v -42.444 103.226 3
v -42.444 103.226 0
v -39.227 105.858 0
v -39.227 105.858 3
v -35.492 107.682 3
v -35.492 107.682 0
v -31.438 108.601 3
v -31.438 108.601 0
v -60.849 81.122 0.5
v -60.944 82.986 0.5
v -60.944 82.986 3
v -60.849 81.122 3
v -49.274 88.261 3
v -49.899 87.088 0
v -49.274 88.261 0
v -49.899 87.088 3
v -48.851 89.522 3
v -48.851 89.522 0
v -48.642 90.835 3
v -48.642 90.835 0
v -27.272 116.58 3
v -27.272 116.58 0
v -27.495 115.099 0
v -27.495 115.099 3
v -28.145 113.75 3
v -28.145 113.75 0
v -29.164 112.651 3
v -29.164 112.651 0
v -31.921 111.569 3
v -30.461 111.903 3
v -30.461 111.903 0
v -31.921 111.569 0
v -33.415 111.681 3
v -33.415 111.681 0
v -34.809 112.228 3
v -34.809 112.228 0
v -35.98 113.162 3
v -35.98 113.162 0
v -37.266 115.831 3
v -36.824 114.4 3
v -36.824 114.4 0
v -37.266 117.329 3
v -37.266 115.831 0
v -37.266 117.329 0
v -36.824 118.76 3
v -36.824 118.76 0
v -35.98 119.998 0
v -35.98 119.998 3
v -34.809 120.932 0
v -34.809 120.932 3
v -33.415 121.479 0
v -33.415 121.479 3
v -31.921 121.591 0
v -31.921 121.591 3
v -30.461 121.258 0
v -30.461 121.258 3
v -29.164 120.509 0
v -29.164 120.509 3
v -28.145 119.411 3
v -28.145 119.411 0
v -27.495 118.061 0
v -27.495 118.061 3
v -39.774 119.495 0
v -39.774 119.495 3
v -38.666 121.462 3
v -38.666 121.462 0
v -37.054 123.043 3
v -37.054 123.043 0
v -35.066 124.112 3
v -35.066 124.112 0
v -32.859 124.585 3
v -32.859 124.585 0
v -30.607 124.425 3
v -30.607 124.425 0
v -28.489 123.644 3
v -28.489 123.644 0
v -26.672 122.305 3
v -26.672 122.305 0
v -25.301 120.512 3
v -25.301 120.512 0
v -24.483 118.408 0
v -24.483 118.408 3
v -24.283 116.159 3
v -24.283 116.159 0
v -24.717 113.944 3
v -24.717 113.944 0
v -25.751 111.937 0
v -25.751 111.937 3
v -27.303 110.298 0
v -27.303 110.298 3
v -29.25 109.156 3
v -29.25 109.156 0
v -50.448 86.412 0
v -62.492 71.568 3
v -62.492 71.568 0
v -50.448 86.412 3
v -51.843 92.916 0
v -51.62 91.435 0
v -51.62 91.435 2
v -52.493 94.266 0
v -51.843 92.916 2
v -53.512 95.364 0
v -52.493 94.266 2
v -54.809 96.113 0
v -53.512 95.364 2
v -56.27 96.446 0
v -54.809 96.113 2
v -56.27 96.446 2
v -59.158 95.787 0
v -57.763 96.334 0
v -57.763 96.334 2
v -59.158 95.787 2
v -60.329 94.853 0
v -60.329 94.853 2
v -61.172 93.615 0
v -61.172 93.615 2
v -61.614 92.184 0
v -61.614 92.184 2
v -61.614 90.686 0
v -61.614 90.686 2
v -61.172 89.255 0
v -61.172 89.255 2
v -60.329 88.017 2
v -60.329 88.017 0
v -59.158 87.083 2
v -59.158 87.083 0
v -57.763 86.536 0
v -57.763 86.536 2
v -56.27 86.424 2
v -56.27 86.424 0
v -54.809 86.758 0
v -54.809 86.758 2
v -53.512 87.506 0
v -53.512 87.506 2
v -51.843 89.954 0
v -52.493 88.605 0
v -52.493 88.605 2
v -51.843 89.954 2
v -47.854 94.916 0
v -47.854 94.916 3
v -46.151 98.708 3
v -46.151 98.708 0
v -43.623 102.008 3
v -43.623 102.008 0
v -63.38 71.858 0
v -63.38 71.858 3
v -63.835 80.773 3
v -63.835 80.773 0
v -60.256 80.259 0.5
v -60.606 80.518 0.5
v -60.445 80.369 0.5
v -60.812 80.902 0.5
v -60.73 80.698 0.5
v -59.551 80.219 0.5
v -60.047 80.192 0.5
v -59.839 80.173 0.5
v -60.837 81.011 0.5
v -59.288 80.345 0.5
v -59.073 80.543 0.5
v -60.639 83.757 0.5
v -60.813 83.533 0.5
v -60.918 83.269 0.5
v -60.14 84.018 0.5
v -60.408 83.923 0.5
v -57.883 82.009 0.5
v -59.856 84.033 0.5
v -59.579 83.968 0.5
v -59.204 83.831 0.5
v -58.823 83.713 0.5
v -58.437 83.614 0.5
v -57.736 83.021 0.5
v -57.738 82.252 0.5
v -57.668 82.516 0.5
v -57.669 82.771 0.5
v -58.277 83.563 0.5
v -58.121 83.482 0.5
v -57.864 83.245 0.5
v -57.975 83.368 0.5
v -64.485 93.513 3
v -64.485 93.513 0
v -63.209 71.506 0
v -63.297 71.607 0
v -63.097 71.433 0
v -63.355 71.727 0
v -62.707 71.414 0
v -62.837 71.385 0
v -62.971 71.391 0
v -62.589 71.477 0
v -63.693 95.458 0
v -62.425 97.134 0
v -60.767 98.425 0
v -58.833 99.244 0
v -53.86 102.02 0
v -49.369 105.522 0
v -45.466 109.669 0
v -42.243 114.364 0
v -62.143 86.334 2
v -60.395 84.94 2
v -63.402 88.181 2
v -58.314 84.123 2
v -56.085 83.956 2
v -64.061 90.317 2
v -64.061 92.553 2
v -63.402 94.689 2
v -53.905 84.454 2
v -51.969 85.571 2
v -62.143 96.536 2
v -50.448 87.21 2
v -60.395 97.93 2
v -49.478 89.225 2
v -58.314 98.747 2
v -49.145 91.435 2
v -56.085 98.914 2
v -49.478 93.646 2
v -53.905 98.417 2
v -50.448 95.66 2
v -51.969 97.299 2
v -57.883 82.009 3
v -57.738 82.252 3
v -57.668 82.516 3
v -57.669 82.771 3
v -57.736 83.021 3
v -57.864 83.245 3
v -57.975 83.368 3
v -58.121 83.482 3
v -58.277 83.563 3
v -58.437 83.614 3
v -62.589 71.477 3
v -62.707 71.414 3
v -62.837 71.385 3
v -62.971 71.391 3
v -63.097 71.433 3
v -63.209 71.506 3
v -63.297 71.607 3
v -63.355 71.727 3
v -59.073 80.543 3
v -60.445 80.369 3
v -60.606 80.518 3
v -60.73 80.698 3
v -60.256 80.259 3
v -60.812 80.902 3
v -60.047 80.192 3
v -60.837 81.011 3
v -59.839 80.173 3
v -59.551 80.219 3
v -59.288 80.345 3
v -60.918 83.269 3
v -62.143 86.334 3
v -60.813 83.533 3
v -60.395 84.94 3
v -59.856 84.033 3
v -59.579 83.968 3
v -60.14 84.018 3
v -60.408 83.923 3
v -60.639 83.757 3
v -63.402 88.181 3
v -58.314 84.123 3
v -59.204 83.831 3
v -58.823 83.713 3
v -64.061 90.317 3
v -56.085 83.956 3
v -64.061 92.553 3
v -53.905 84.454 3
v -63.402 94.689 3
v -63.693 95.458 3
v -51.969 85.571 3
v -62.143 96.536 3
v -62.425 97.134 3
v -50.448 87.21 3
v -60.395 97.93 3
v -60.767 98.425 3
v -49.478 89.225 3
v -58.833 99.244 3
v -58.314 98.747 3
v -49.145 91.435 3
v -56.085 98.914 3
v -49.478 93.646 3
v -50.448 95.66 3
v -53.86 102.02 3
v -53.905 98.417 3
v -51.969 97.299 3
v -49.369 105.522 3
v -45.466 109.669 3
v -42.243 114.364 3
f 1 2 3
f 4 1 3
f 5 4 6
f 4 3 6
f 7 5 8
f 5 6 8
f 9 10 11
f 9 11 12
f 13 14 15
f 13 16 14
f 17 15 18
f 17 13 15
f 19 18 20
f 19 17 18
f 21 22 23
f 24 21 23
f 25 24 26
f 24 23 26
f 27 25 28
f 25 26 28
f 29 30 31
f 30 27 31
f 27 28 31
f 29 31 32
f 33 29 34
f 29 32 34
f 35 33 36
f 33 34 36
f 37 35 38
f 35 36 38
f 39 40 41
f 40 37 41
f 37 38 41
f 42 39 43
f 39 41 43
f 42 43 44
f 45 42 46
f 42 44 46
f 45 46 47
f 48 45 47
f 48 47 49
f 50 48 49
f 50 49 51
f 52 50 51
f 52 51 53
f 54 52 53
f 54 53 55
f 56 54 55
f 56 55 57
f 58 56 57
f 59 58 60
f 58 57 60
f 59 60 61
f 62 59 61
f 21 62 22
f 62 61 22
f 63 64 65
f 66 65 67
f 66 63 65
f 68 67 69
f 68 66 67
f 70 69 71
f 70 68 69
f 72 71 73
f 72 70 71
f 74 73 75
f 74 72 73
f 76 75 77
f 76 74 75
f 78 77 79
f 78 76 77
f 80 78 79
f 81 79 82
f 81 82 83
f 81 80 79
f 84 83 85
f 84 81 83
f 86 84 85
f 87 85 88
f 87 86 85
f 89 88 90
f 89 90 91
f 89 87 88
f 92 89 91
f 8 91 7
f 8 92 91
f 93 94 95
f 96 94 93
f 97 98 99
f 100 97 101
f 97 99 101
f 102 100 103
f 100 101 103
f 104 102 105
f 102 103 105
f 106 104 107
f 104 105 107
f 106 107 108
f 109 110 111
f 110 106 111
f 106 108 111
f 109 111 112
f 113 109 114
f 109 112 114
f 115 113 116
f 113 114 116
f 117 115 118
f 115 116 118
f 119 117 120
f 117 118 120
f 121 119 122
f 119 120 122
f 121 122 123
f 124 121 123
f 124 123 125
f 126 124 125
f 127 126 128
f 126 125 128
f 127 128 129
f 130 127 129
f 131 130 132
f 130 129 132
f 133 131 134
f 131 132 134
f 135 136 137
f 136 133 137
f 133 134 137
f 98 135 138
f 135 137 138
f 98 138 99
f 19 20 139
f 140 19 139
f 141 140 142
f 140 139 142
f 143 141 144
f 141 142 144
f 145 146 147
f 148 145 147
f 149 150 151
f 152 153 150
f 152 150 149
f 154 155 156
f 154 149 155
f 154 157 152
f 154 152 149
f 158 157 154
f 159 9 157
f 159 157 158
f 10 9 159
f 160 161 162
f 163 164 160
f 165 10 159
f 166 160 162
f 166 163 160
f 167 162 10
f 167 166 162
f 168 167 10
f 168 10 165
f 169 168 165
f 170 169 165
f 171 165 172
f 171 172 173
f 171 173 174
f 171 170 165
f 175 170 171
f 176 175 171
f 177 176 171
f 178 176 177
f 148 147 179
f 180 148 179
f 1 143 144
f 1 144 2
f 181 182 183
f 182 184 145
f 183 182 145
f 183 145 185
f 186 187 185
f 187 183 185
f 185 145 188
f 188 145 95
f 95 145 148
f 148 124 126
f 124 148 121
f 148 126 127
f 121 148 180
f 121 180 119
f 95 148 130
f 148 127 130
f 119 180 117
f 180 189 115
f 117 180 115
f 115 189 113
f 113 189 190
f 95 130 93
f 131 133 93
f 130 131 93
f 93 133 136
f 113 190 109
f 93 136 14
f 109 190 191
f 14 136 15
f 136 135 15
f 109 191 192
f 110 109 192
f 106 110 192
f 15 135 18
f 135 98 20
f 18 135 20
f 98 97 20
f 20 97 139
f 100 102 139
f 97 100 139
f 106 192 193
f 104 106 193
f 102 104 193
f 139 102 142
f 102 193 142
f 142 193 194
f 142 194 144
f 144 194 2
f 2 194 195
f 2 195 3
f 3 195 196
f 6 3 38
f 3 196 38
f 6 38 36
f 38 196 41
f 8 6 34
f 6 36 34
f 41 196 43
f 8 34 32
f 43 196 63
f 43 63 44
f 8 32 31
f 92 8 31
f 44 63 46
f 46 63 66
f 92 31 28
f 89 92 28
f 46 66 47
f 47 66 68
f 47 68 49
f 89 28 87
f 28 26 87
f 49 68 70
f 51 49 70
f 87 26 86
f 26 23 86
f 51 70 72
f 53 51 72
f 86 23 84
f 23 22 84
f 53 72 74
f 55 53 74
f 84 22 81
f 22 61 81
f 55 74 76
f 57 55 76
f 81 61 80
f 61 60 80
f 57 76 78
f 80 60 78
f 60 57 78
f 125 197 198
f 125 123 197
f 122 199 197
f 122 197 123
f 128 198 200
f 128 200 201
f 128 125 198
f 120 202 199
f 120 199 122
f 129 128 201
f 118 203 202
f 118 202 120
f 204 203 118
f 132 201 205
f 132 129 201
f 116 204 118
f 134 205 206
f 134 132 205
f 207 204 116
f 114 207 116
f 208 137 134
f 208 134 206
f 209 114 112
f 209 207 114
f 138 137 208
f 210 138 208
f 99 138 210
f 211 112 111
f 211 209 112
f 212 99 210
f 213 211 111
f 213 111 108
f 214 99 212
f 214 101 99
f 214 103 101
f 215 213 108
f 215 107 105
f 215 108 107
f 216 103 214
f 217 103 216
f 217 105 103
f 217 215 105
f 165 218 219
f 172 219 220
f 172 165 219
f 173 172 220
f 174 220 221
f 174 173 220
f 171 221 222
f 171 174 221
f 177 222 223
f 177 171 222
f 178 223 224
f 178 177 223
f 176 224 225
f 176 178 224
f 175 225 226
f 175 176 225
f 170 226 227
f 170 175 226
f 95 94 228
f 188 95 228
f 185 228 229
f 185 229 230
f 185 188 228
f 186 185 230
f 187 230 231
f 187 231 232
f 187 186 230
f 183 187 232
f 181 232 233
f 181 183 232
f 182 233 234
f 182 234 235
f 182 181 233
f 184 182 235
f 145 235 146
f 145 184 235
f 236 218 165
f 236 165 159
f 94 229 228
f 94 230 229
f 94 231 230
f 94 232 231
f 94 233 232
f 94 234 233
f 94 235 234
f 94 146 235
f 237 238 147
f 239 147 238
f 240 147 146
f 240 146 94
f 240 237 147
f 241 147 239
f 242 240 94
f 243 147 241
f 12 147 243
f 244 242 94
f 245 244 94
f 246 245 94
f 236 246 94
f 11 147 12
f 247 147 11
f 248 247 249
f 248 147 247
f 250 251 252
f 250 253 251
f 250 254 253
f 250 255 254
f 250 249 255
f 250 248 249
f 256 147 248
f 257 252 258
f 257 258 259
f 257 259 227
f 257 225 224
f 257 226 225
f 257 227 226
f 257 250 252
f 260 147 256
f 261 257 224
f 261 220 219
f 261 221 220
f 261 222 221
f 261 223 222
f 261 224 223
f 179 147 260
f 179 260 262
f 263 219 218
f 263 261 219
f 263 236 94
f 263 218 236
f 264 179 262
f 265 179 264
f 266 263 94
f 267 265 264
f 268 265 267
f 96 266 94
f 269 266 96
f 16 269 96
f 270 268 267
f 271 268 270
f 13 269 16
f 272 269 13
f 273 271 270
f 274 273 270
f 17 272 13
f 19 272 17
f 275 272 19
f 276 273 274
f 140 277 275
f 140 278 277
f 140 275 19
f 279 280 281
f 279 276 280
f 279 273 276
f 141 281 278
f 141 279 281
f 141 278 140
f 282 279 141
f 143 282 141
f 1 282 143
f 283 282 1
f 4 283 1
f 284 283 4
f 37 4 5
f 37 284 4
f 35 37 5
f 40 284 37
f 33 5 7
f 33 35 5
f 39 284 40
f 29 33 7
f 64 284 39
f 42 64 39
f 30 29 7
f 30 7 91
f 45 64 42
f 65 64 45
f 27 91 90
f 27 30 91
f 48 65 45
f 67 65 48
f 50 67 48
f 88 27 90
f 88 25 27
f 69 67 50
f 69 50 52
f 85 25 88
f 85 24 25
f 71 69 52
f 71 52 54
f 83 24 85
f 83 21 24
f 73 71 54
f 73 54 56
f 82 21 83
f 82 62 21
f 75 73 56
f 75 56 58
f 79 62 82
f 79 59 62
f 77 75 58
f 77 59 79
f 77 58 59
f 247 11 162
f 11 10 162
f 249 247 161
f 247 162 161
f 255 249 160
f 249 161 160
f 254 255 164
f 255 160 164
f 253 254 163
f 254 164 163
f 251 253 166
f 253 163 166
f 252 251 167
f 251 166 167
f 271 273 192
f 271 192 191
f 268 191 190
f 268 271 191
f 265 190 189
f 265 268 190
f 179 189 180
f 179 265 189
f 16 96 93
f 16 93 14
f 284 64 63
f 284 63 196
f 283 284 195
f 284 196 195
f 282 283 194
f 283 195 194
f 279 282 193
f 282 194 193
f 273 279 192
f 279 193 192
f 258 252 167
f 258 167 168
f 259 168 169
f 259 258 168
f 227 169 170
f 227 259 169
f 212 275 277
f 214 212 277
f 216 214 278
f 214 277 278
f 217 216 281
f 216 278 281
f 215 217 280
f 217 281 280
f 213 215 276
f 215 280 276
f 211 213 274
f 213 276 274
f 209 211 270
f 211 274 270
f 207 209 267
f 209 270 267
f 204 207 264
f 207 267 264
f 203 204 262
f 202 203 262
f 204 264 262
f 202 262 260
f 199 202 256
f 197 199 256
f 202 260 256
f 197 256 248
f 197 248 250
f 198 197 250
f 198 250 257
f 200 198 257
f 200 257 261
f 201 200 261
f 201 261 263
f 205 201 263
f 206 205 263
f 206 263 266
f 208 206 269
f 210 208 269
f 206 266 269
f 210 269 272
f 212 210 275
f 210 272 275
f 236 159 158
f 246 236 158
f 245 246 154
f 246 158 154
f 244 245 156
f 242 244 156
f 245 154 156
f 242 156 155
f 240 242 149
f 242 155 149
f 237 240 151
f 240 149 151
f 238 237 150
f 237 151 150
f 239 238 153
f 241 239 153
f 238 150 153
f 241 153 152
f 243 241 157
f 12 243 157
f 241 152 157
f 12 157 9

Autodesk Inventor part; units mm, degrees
ref_plane "YZ Plane" through (0, 0, 0) normal (1, 0, 0) x (0, 1, 0)
ref_plane "XZ Plane" through (0, 0, 0) normal (0, 1, 0) x (-1, 0, 0)
ref_plane "XY Plane" through (0, 0, 0) normal (0, 0, 1) x (1, 0, 0)
sketch "スケッチ2" plane through (0, 0, 0) normal (0, 0, 1) x (1, 0, 0)
  circle A0 centre (-56.644, 91.4364) radius 8.025
  circle A1 centre (-56.644, 91.4364) radius 5.025
  arc A2 (-29.1424, 109.2011) -> (-49.1672, 88.5212) centre (-14.5297, 75.0161) ccw
  arc A3 (-59.7983, 98.8155) -> (-39.7735, 119.4954) centre (-74.411, 133.0005) ccw
  circle A4 centre (-32.2967, 116.5802) radius 8.025
  circle A5 centre (-32.2967, 116.5802) radius 5.025
  line L0 (-50.8789, 85.8539) -> (-64.3562, 71.9357)
  line L1 (-64.3562, 71.9357) -> (-64.668, 91.3073)
  line L2 (-56.644, 91.4364) -> (-32.2967, 116.5802) construction
  point P0 (0, 0)
  point P1 (0, 0)
  dimension "d5" = 45
extrude "押し出し2" add sketch "スケッチ2" along normal blind 3
fillet "フィレット2" radius 0.5 1 edges at (-64.3562, 71.9357, 1.5)
sketch "スケッチ3" plane through (0, 0, 3) normal (0, 0, 1) x (1, 0, 0)
  line L0 (-63.5165, 72.8029) -> (-50.8789, 85.8539) projected
  arc A0 (-64.3756, 73.1427) -> (-63.5165, 72.8029) centre (-63.8757, 73.1507) ccw projected
  line L1 (-64.668, 91.3073) -> (-64.3756, 73.1427) projected
  arc A1 (-59.7983, 98.8155) -> (-64.668, 91.3073) centre (-56.644, 91.4364) ccw projected
  circle A2 centre (-56.644, 91.4364) radius 5.025 projected
  arc A3 (-50.8789, 85.8539) -> (-49.1672, 88.5212) centre (-56.644, 91.4364) ccw projected
  line L2 (-64.2129, 94.1033) -> (-63.8416, 71.0319)
  point P0 (0, 0)
  point P1 (-63.8676, 72.6508)
  dimension "d9" = 0.5
extrude "押し出し3" cut sketch "スケッチ3" against normal through all
fillet "フィレット3" radius 1 1 edges at (-63.8676, 72.6508, 1.5)
sketch "スケッチ4" plane through (0, 0, 3) normal (0, 0, 1) x (1, 0, 0)
  circle A0 centre (-56.644, 91.4364) radius 5.025 projected
  circle A1 centre (-32.2967, 116.5802) radius 5.025 projected
  arc A2 (-50.8789, 85.8539) -> (-49.1672, 88.5212) centre (-56.644, 91.4364) ccw projected
  line L0 (-50.8789, 85.8539) -> (-62.1849, 74.178) projected
  arc A3 (-63.9031, 74.8576) -> (-62.1849, 74.178) centre (-62.9033, 74.8737) ccw projected
  line L1 (-63.9031, 74.8576) -> (-64.2129, 94.1033) projected
  arc A4 (-59.7983, 98.8155) -> (-64.2129, 94.1033) centre (-56.644, 91.4364) ccw projected
  arc A5 (-59.7983, 98.8155) -> (-39.7735, 119.4954) centre (-74.411, 133.0005) ccw projected
  arc A6 (-29.1424, 109.2011) -> (-39.7735, 119.4954) centre (-32.2967, 116.5802) ccw projected
  arc A7 (-29.1424, 109.2011) -> (-49.1672, 88.5212) centre (-14.5297, 75.0161) ccw projected
  point P0 (0, 0)
sketch "スケッチ5" plane through (0, 0, 3) normal (0, 0, 1) x (1, 0, 0)
  circle A0 centre (-56.6451, 91.4352) radius 5.025
  circle A1 centre (-32.2979, 116.579) radius 5.025
  arc A2 (-50.2754, 86.5539) -> (-49.1683, 88.52) centre (-56.6451, 91.4352) ccw
  line L0 (-53.8399, 82.796) -> (-62.186, 74.1768)
  arc A3 (-63.9043, 74.8564) -> (-63.4923, 74.0635) centre (-62.9044, 74.8725) ccw
  line L1 (-63.9043, 74.8564) -> (-64.1215, 88.3503)
  arc A4 (-59.7994, 98.8143) -> (-64.4699, 93.2166) centre (-56.6451, 91.4352) ccw
  arc A5 (-59.7994, 98.8143) -> (-39.7746, 119.4942) centre (-74.4122, 132.9993) ccw
  arc A6 (-29.1436, 109.1999) -> (-39.7746, 119.4942) centre (-32.2979, 116.579) ccw
  arc A7 (-29.1436, 109.1999) -> (-49.1683, 88.52) centre (-14.5308, 75.0149) ccw
  line L2 (-83.3619, 46.2586) -> (-83.0117, 46.8656)
  arc A8 (-83.0117, 46.8656) -> (-84.2091, 48.3089) centre (-83.8778, 47.3654) ccw
  arc A9 (-84.8038, 48.1181) -> (-84.2091, 48.3089) centre (-88.0269, 59.1832) ccw
  arc A10 (-84.8038, 48.1181) -> (-85.306, 46.5345) centre (-84.5242, 47.158) ccw
  arc A11 (-85.0521, 46.1918) -> (-85.306, 46.5345) centre (-90.0169, 42.7785) ccw
  arc A12 (-85.0521, 46.1918) -> (-83.3619, 46.2586) centre (-84.2281, 46.7584) ccw
  arc A13 (-83.3002, 71.3425) -> (-83.1434, 69.6224) centre (-82.7197, 70.5282) ccw
  arc A14 (-76.5108, 59.6362) -> (-83.1434, 69.6224) centre (-88.0269, 59.1832) ccw
  arc A15 (-76.5108, 59.6362) -> (-74.7281, 59.0541) centre (-75.5116, 59.6755) ccw
  line L3 (-74.7281, 59.0541) -> (-66.7908, 69.0625)
  arc A16 (-66.7908, 69.0625) -> (-66.5756, 69.7348) centre (-67.5743, 69.6838) ccw
  line L4 (-66.5756, 69.7348) -> (-66.7153, 72.4721)
  arc A17 (-66.7153, 72.4721) -> (-67.8599, 73.4104) centre (-67.714, 72.4211) ccw
  arc A18 (-72.6132, 76.6262) -> (-67.8599, 73.4104) centre (-68.4798, 77.615) ccw
  arc A19 (-72.6132, 76.6262) -> (-73.9849, 77.3105) centre (-73.5858, 76.3936) ccw
  arc A20 (-73.9849, 77.3105) -> (-82.4826, 71.9828) centre (-60.5442, 46.4316) ccw
  arc A21 (-83.3002, 71.3425) -> (-82.4826, 71.9828) centre (-89.9903, 80.7269) ccw
  arc A22 (-110.8315, 31.539) -> (-109.4939, 30.5036) centre (-109.8361, 31.4432) ccw
  arc A23 (-101.7829, 26.9363) -> (-109.4939, 30.5036) centre (-107.4323, 24.8423) ccw
  arc A24 (-101.7829, 26.9363) -> (-100.1278, 26.5873) centre (-100.8452, 27.2839) ccw
  line L5 (-100.1278, 26.5873) -> (-91.546, 35.4257)
  arc A25 (-91.546, 35.4257) -> (-91.9436, 37.0698) centre (-92.2634, 36.1224) ccw
  arc A26 (-93.6931, 47.552) -> (-91.9436, 37.0698) centre (-90.0169, 42.7785) ccw
  arc A27 (-93.6931, 47.552) -> (-93.8022, 49.2096) centre (-94.3033, 48.3443) ccw
  arc A28 (-99.3351, 56.9581) -> (-93.8022, 49.2096) centre (-88.0269, 59.1832) ccw
  arc A29 (-99.3351, 56.9581) -> (-101.1863, 57.258) centre (-100.3162, 56.765) ccw
  line L6 (-101.1863, 57.258) -> (-106.2752, 48.2771)
  arc A30 (-106.2752, 48.2771) -> (-105.4755, 46.7866) centre (-105.4052, 47.7841) ccw
  arc A31 (-109.0024, 35.6122) -> (-105.4755, 46.7866) centre (-105.8991, 40.7765) ccw
  arc A32 (-109.0024, 35.6122) -> (-110.5128, 34.8508) centre (-109.5174, 34.755) ccw
  line L7 (-110.5128, 34.8508) -> (-110.8315, 31.539)
  circle A33 centre (-68.4798, 77.615) radius 1.25
  arc A34 (-64.1344, 80.7577) -> (-66.454, 82.6296) centre (-66.1318, 80.6557) ccw
  line L8 (-64.1344, 80.7577) -> (-63.5026, 68.3807)
  line L9 (-63.5026, 68.3807) -> (-76.8311, 51.5743)
  line L10 (-76.8311, 51.5743) -> (-83.9322, 39.2676)
  arc A35 (-84.9769, 37.8848) -> (-83.9322, 39.2676) centre (-90.0169, 42.7785) ccw
  line L11 (-84.9769, 37.8848) -> (-102.3922, 19.9486)
  arc A36 (-114.425, 25.5151) -> (-102.3922, 19.9486) centre (-107.4323, 24.8423) ccw
  line L12 (-114.425, 25.5151) -> (-112.8918, 41.4493)
  arc A37 (-112.0111, 44.2398) -> (-112.8918, 41.4493) centre (-105.8991, 40.7765) ccw
  line L13 (-112.0111, 44.2398) -> (-99.7723, 65.8386)
  arc A38 (-91.2432, 72.2945) -> (-99.7723, 65.8386) centre (-88.0269, 59.1832) ccw
  arc A39 (-91.2432, 72.2945) -> (-84.4369, 74.2589) centre (-89.9903, 80.7269) ccw
  arc A40 (-66.454, 82.6296) -> (-84.4369, 74.2589) centre (-60.5442, 46.4316) ccw
  circle A41 centre (-56.6793, 91.4683) radius 4
  circle A42 centre (-56.6793, 91.4683) radius 1.25
  circle A43 centre (-90.0169, 42.7785) radius 3.025
  circle A44 centre (-105.8991, 40.7765) radius 3.025
  circle A45 centre (-107.4323, 24.8423) radius 3.025
  circle A46 centre (-88.0269, 59.1832) radius 8.525
  circle A47 centre (-56.6793, 91.4683) radius 1.25
  line L14 (-32.2979, 116.579) -> (-56.6793, 91.4683)
  line L15 (-56.6793, 91.4683) -> (-88.0269, 59.1832)
  line L16 (-63.1972, 68.283) -> (-63.8347, 80.773)
  arc A48 (-63.8347, 80.773) -> (-66.5024, 82.9257) centre (-66.1318, 80.6557) ccw
  arc A49 (-66.5024, 82.9257) -> (-84.6323, 74.4865) centre (-60.5442, 46.4316) ccw
  arc A50 (-91.2565, 72.6) -> (-84.6323, 74.4865) centre (-89.9903, 80.7269) ccw
  arc A51 (-91.2565, 72.6) -> (-100.0334, 65.9865) centre (-88.0269, 59.1832) ccw
  line L17 (-100.0334, 65.9865) -> (-112.2721, 44.3877)
  arc A52 (-112.2721, 44.3877) -> (-113.1904, 41.4781) centre (-105.8991, 40.7765) ccw
  line L18 (-113.1904, 41.4781) -> (-114.7236, 25.5439)
  arc A53 (-114.7236, 25.5439) -> (-102.177, 19.7396) centre (-107.4323, 24.8423) ccw
  line L19 (-102.177, 19.7396) -> (-84.7616, 37.6758)
  arc A54 (-84.7616, 37.6758) -> (-83.6724, 39.1176) centre (-90.0169, 42.7785) ccw
  line L20 (-83.6724, 39.1176) -> (-76.5823, 51.4052)
  line L21 (-76.5823, 51.4052) -> (-63.1972, 68.283)
  arc A55 (-50.1385, 86.7434) -> (-64.1215, 88.3503) centre (-56.6793, 91.4683) ccw
  line L22 (-63.8347, 80.773) -> (-64.5039, 93.8831)
  line L23 (-76.8311, 51.5743) -> (-63.2204, 68.7366)
  circle A56 centre (-62.7886, 70.0857) radius 0.5
  line L24 (-62.3833, 69.7929) -> (-50.1385, 86.7434)
  line L25 (-63.5026, 68.3807) -> (-63.2204, 68.7366)
  line L26 (-62.3968, 69.775) -> (-61.9303, 70.3632)
  point P0 (0, 0)
  point P1 (0, 0)
  point P2 (0, 0)
  point P3 (-64.214, 94.1021)
  point P4 (-63.996, 83.9328)
  point P5 (-64.0495, 83.8777)
  point P6 (-64.2363, 88.6401)
  point P7 (-64.1215, 88.3503)
  point P8 (-50.2754, 86.5539)
  point P9 (-63.2879, 70.0602)
  point P10 (-64.0754, 85.487)
  point P11 (-58.8289, 99.2457)
  point P12 (-49.1573, 88.5483)
  point P13 (-64.012, 81.5482)
  point P14 (-64.485, 93.5124)
  dimension "d13" = 0.3
  dimension "d14" = 1
extrude "押し出し4" cut sketch "スケッチ5" against normal blind 3 contours L22 A48 L1 L15 | L16 A3 L8 L1 A48 | L8 A3 L1
extrude "押し出し5" cut sketch "スケッチ5" against normal blind 3 contours A0 L15 A41 L14 | A0 L14 A55 L24 A56 L16 L22 L15 | L14 A41 L15 A0 | A0 L15 L22 L1 A55 A4 A5 L14 | L14 A42 L15 A41 | A41 L15 A42 L14 | L22 A48 L1 L15 | L15 L1 L22 | A2 L24 A55 | A5 A4 L22 A55 | L14 L15 A42 | A42 L15 L14 | L22 A55 L1 | L22 A55 | A56
extrude "押し出し6" add sketch "スケッチ5" against normal blind 3 contours A0 L14 A55 L24 A56 L16 L22 L15 | A0 L15 L22 L1 A55 A4 A5 L14 | A2 L24 A55 | A5 A4 L22 A55 | L22 A55 L1 | A56
sketch "スケッチ6" plane through (0, 0, 3) normal (0, 0, 1) x (1, 0, 0)
  arc A0 (-58.8326, 99.2446) -> (-39.7735, 119.4954) centre (-74.411, 133.0005) ccw projected
  arc A1 (-29.1424, 109.2011) -> (-39.7735, 119.4954) centre (-32.2967, 116.5802) ccw projected
  arc A2 (-29.1424, 109.2011) -> (-49.1672, 88.5212) centre (-14.5297, 75.0161) ccw projected
  circle A3 centre (-32.2967, 116.5802) radius 5.025 projected
  circle A4 centre (-56.6451, 91.4352) radius 5.025 projected
  arc A5 (-58.8326, 99.2446) -> (-64.485, 93.5124) centre (-56.6793, 91.4683) ccw projected
  arc A6 (-50.2787, 86.5493) -> (-49.1672, 88.5212) centre (-56.644, 91.4364) ccw projected
  line L0 (-50.2787, 86.5493) -> (-62.3833, 69.7929) projected
  arc A7 (-63.2879, 70.0602) -> (-62.3833, 69.7929) centre (-62.7886, 70.0857) ccw projected
  line L1 (-63.2879, 70.0602) -> (-64.485, 93.5124) projected
  point P0 (0, 0)
sketch "スケッチ7" plane through (0, 0, 3) normal (0, 0, 1) x (1, 0, 0)
  arc A0 (-58.8326, 99.2446) -> (-39.7735, 119.4954) centre (-74.411, 133.0005) ccw projected
  arc A1 (-29.1424, 109.2011) -> (-39.7735, 119.4954) centre (-32.2967, 116.5802) ccw projected
  arc A2 (-29.1424, 109.2011) -> (-49.1672, 88.5212) centre (-14.5297, 75.0161) ccw projected
  circle A3 centre (-32.2967, 116.5802) radius 5.025 projected
  circle A4 centre (-56.6451, 91.4352) radius 5.025 projected
  arc A5 (-58.8326, 99.2446) -> (-64.485, 93.5124) centre (-56.6793, 91.4683) ccw projected
  arc A6 (-50.2787, 86.5493) -> (-49.1672, 88.5212) centre (-56.644, 91.4364) ccw projected
  line L0 (-50.2787, 86.5493) -> (-62.3833, 69.7929) projected
  arc A7 (-63.2879, 70.0602) -> (-62.3833, 69.7929) centre (-62.7886, 70.0857) ccw projected
  line L1 (-63.2879, 70.0602) -> (-64.485, 93.5124) projected
  point P0 (0, 0)
sketch "スケッチ8" plane through (0, 0, 3) normal (0, 0, 1) x (1, 0, 0)
  circle A0 centre (-56.6451, 91.4352) radius 5.025 projected
  arc A1 (-58.8326, 99.2446) -> (-64.485, 93.5124) centre (-56.6793, 91.4683) ccw projected
  arc A2 (-58.8326, 99.2446) -> (-39.7735, 119.4954) centre (-74.411, 133.0005) ccw projected
  arc A3 (-29.1424, 109.2011) -> (-39.7735, 119.4954) centre (-32.2967, 116.5802) ccw projected
  arc A4 (-29.1424, 109.2011) -> (-49.1672, 88.5212) centre (-14.5297, 75.0161) ccw projected
  arc A5 (-50.2787, 86.5493) -> (-49.1672, 88.5212) centre (-56.644, 91.4364) ccw projected
  line L0 (-50.2787, 86.5493) -> (-62.3833, 69.7929) projected
  arc A6 (-63.2879, 70.0602) -> (-62.3833, 69.7929) centre (-62.7886, 70.0857) ccw projected
  line L1 (-63.2879, 70.0602) -> (-64.485, 93.5124) projected
  circle A7 centre (-32.2967, 116.5802) radius 5.025 projected
  line L2 (-56.644, 91.4364) -> (-32.2967, 116.5802)
  line L3 (-29.5619, 125.8734) -> (-71.0195, 83.0595)
  arc A8 (-58.8326, 99.2446) -> (-39.7735, 119.4954) centre (-74.411, 133.0005) ccw projected
  line L4 (-56.644, 91.4364) -> (-32.2967, 116.5802) construction
  line L5 (-55.2072, 90.0451) -> (-30.8599, 115.1889)
  line L6 (-33.7335, 117.9715) -> (-58.0808, 92.8277)
  arc A9 (-58.0808, 92.8277) -> (-55.2072, 90.0451) centre (-56.644, 91.4364) ccw
  arc A10 (-30.8599, 115.1889) -> (-33.7335, 117.9715) centre (-32.2967, 116.5802) ccw
  arc A11 (-29.1424, 109.2011) -> (-49.1672, 88.5212) centre (-14.5297, 75.0161) ccw projected
  circle A12 centre (-56.644, 91.4364) radius 8.025
  circle A13 centre (-32.2967, 116.5802) radius 8.025
  point P0 (0, 0)
  point P1 (-44.4704, 104.0083)
  point P2 (-36.2663, 109.6057)
  point P3 (-49.8009, 95.6283)
  dimension "d21" = 4.5
  dimension "d22" = 4
extrude "押し出し7" cut sketch "スケッチ8" against normal blind 10 contours L5 A13 A4 A12
fillet "フィレット4" radius 18 2 edges at (-49.8009, 95.6283, 1.5) (-36.2663, 109.6057, 1.5)
sketch "スケッチ9" plane through (0, 0, 3) normal (0, 0, 1) x (1, 0, 0)
  circle A0 centre (-56.6451, 91.4352) radius 5.025 projected
  arc A1 (-58.8326, 99.2446) -> (-64.485, 93.5124) centre (-56.6793, 91.4683) ccw projected
  arc A2 (-58.8326, 99.2446) -> (-39.7735, 119.4954) centre (-74.411, 133.0005) ccw projected
  arc A3 (-31.4383, 108.6012) -> (-39.7735, 119.4954) centre (-32.2967, 116.5802) ccw projected
  arc A4 (-31.4383, 108.6012) -> (-42.4439, 103.226) centre (-29.5128, 90.7045) ccw projected
  line L0 (-42.4439, 103.226) -> (-43.6232, 102.0081) projected
  arc A5 (-43.6232, 102.0081) -> (-48.6415, 90.8352) centre (-30.6921, 89.4866) ccw projected
  arc A6 (-50.2787, 86.5493) -> (-48.6415, 90.8352) centre (-56.644, 91.4364) ccw projected
  line L1 (-50.2787, 86.5493) -> (-62.3833, 69.7929) projected
  arc A7 (-63.2879, 70.0602) -> (-62.3833, 69.7929) centre (-62.7886, 70.0857) ccw projected
  line L2 (-63.2879, 70.0602) -> (-64.485, 93.5124) projected
  circle A8 centre (-32.2967, 116.5802) radius 5.025 projected
  line L3 (-60.6541, 77.3098) -> (-52.682, 88.3456)
  arc A9 (-52.682, 88.3456) -> (-51.6331, 91.0599) centre (-56.644, 91.4364) ccw
  arc A10 (-45.7784, 104.095) -> (-51.6331, 91.0599) centre (-30.6921, 89.4866) ccw
  line L4 (-45.7784, 104.095) -> (-44.5991, 105.3129)
  arc A11 (-31.7592, 111.584) -> (-44.5991, 105.3129) centre (-29.5128, 90.7045) ccw
  arc A12 (-31.7592, 111.584) -> (-36.9785, 118.4056) centre (-32.2967, 116.5802) ccw
  arc A13 (-57.8274, 96.4055) -> (-36.9785, 118.4056) centre (-74.411, 133.0005) ccw
  arc A14 (-57.8274, 96.4055) -> (-61.4624, 93.1463) centre (-56.6793, 91.4683) ccw
  line L5 (-61.4624, 93.1463) -> (-60.6541, 77.3098)
  circle A15 centre (-56.644, 91.4364) radius 8.025
  point P0 (0, 0)
  point P1 (-56.239, 83.4216)
  point P2 (-61.0322, 84.7174)
  dimension "d26" = 3
extrude "押し出し8" cut sketch "スケッチ9" against normal blind 2.5 contours L3 L5 A15
fillet "フィレット5" radius 1 3 edges at (-61.0322, 84.7174, 1.75) (-56.239, 83.4216, 1.75) (-60.6541, 77.3098, 1.75)
sketch "スケッチ10" plane through (0, 0, 3) normal (0, 0, 1) x (1, 0, 0)
  line L0 (-60.799, 80.1484) -> (-60.9438, 82.9858) projected
  arc A0 (-59.5793, 83.9675) -> (-60.9438, 82.9858) centre (-59.9451, 83.0368) ccw projected
  arc A1 (-59.5793, 83.9675) -> (-57.9522, 83.5187) centre (-56.644, 91.4364) ccw projected
  arc A2 (-57.3045, 81.9465) -> (-57.9522, 83.5187) centre (-58.1152, 82.5321) ccw projected
  line L1 (-57.3045, 81.9465) -> (-58.9896, 79.6138) projected
  arc A3 (-60.799, 80.1484) -> (-58.9896, 79.6138) centre (-59.8003, 80.1994) ccw projected
  arc A4 (-31.4383, 108.6012) -> (-39.7735, 119.4954) centre (-32.2967, 116.5802) ccw projected
  arc A5 (-58.8326, 99.2446) -> (-39.7735, 119.4954) centre (-74.411, 133.0005) ccw projected
  arc A6 (-58.8326, 99.2446) -> (-64.485, 93.5124) centre (-56.6793, 91.4683) ccw projected
  line L2 (-64.485, 93.5124) -> (-63.2879, 70.0602) projected
  arc A7 (-63.2879, 70.0602) -> (-62.3833, 69.7929) centre (-62.7886, 70.0857) ccw projected
  line L3 (-62.3833, 69.7929) -> (-50.2787, 86.5493) projected
  arc A8 (-50.2787, 86.5493) -> (-48.6415, 90.8352) centre (-56.644, 91.4364) ccw projected
  arc A9 (-43.6232, 102.0081) -> (-48.6415, 90.8352) centre (-30.6921, 89.4866) ccw projected
  line L4 (-43.6232, 102.0081) -> (-42.4439, 103.226) projected
  arc A10 (-31.4383, 108.6012) -> (-42.4439, 103.226) centre (-29.5128, 90.7045) ccw projected
  circle A11 centre (-56.6451, 91.4352) radius 5.025 projected
  circle A12 centre (-32.2967, 116.5802) radius 5.025 projected
  circle A13 centre (-56.6451, 91.4352) radius 8.025
  point P0 (0, 0)
  dimension "d31" = 16.05
sketch "スケッチ11" plane through (0, 0, 3) normal (0, 0, 1) x (1, 0, 0)
  line L0 (-61.9172, 97.5483) -> (-93.2211, 70.5805)
  arc A0 (-92.0093, 71.0583) -> (-93.2211, 70.5805) centre (-88.0269, 59.1832) ccw
  line L1 (-87.2798, 72.6443) -> (-92.0093, 71.0583)
  arc A1 (-87.2798, 72.6443) -> (-84.4369, 74.259) centre (-89.9903, 80.727) ccw
  arc A2 (-66.4541, 82.6296) -> (-84.4369, 74.259) centre (-60.5442, 46.4317) ccw
  arc A3 (-64.1344, 80.7577) -> (-66.4541, 82.6296) centre (-66.1318, 80.6558) ccw
  line L2 (-63.5959, 70.2078) -> (-64.1344, 80.7577)
  line L3 (-63.5959, 70.2078) -> (-50.4477, 86.412)
  arc A4 (-50.4477, 86.412) -> (-61.9172, 97.5483) centre (-56.6794, 91.4684) ccw
  circle A5 centre (-56.6794, 91.4684) radius 4
  line L4 (-60.799, 80.1484) -> (-60.9438, 82.9858) projected
  arc A6 (-59.5793, 83.9675) -> (-60.9438, 82.9858) centre (-59.9451, 83.0368) ccw projected
  arc A7 (-59.5793, 83.9675) -> (-57.9522, 83.5187) centre (-56.644, 91.4364) ccw projected
  arc A8 (-57.3045, 81.9465) -> (-57.9522, 83.5187) centre (-58.1152, 82.5321) ccw projected
  line L5 (-57.3045, 81.9465) -> (-58.9896, 79.6138) projected
  arc A9 (-60.799, 80.1484) -> (-58.9896, 79.6138) centre (-59.8003, 80.1994) ccw projected
  arc A10 (-31.4383, 108.6012) -> (-39.7735, 119.4954) centre (-32.2967, 116.5802) ccw projected
  arc A11 (-58.8326, 99.2446) -> (-39.7735, 119.4954) centre (-74.411, 133.0005) ccw projected
  arc A12 (-58.8326, 99.2446) -> (-64.485, 93.5124) centre (-56.6793, 91.4683) ccw projected
  line L6 (-64.485, 93.5124) -> (-63.2879, 70.0602) projected
  arc A13 (-63.2879, 70.0602) -> (-62.3833, 69.7929) centre (-62.7886, 70.0857) ccw projected
  line L7 (-62.3833, 69.7929) -> (-50.2787, 86.5493) projected
  arc A14 (-50.2787, 86.5493) -> (-48.6415, 90.8352) centre (-56.644, 91.4364) ccw projected
  arc A15 (-43.6232, 102.0081) -> (-48.6415, 90.8352) centre (-30.6921, 89.4866) ccw projected
  line L8 (-43.6232, 102.0081) -> (-42.4439, 103.226) projected
  arc A16 (-31.4383, 108.6012) -> (-42.4439, 103.226) centre (-29.5128, 90.7045) ccw projected
  circle A17 centre (-56.6451, 91.4352) radius 5.025 projected
  circle A18 centre (-32.2967, 116.5802) radius 5.025 projected
  line L9 (-50.4477, 86.412) -> (-49.8116, 87.196)
  line L10 (-62.3833, 69.7929) -> (-50.2787, 86.5493) projected
  point P0 (0, 0)
  point P1 (0, 0)
  point P2 (-49.8994, 87.0877)
  point P3 (-63.3132, 70.5562)
extrude "押し出し9" cut sketch "スケッチ11" against normal blind 10 contours L9 A14 L7 A13 L6 L3
fillet "フィレット6" radius 0.5 1 edges at (-63.3132, 70.5562, 1.5)
sketch "スケッチ12" plane through (0, 0, 3) normal (0, 0, 1) x (1, 0, 0)
  line L0 (-60.799, 80.1484) -> (-60.9438, 82.9858) projected
  arc A0 (-59.5793, 83.9675) -> (-60.9438, 82.9858) centre (-59.9451, 83.0368) ccw projected
  arc A1 (-59.5793, 83.9675) -> (-57.9522, 83.5187) centre (-56.644, 91.4364) ccw projected
  arc A2 (-57.3045, 81.9465) -> (-57.9522, 83.5187) centre (-58.1152, 82.5321) ccw projected
  line L1 (-57.3045, 81.9465) -> (-58.9896, 79.6138) projected
  arc A3 (-60.799, 80.1484) -> (-58.9896, 79.6138) centre (-59.8003, 80.1994) ccw projected
  arc A4 (-63.3797, 71.8578) -> (-62.4921, 71.5682) centre (-62.8803, 71.8833) ccw projected
  line L2 (-62.4921, 71.5682) -> (-49.8994, 87.0877) projected
  arc A5 (-49.8994, 87.0877) -> (-48.6415, 90.8352) centre (-56.644, 91.4364) ccw projected
  arc A6 (-43.6232, 102.0081) -> (-48.6415, 90.8352) centre (-30.6921, 89.4866) ccw projected
  line L3 (-43.6232, 102.0081) -> (-42.4439, 103.226) projected
  arc A7 (-31.4383, 108.6012) -> (-42.4439, 103.226) centre (-29.5128, 90.7045) ccw projected
  arc A8 (-31.4383, 108.6012) -> (-39.7735, 119.4954) centre (-32.2967, 116.5802) ccw projected
  arc A9 (-58.8326, 99.2446) -> (-39.7735, 119.4954) centre (-74.411, 133.0005) ccw projected
  arc A10 (-58.8326, 99.2446) -> (-64.485, 93.5124) centre (-56.6793, 91.4683) ccw projected
  line L4 (-64.485, 93.5124) -> (-63.3797, 71.8578) projected
  circle A11 centre (-56.6451, 91.4352) radius 5.025 projected
  circle A12 centre (-32.2967, 116.5802) radius 5.025 projected
  line L5 (-52.3441, 88.8361) -> (-60.7158, 78.5186)
  line L6 (-60.7158, 78.5186) -> (-61.4624, 93.1463)
  arc A13 (-57.8274, 96.4055) -> (-61.4624, 93.1463) centre (-56.6793, 91.4683) ccw
  arc A14 (-57.8274, 96.4055) -> (-36.9785, 118.4056) centre (-74.411, 133.0005) ccw
  arc A15 (-31.7592, 111.584) -> (-36.9785, 118.4056) centre (-32.2967, 116.5802) ccw
  arc A16 (-31.7592, 111.584) -> (-44.5991, 105.3129) centre (-29.5128, 90.7045) ccw
  line L7 (-44.5991, 105.3129) -> (-45.7784, 104.095)
  arc A17 (-45.7784, 104.095) -> (-51.6331, 91.0599) centre (-30.6921, 89.4866) ccw
  arc A18 (-52.3441, 88.8361) -> (-51.6331, 91.0599) centre (-56.644, 91.4364) ccw
  point P0 (0, 0)
  point P1 (-57.1774, 82.8794)
  point P2 (-60.1206, 79.2521)
  dimension "d35" = 3
extrude "押し出し10" add sketch "スケッチ12" against normal blind 3 contours L5 A2 L1 A3
fillet "フィレット7" radius 1 2 edges at (-60.1206, 79.2521, 1.75) (-57.1774, 82.8794, 1.75)
sketch "スケッチ13" plane through (0, 0, 3) normal (0, 0, 1) x (1, 0, 0)
  arc A0 (-57.8834, 82.0093) -> (-58.4365, 83.6142) centre (-58.6599, 82.6394) ccw projected
  line L0 (-57.8834, 82.0093) -> (-59.0734, 80.5427) projected
  arc A1 (-60.8486, 81.1218) -> (-59.0734, 80.5427) centre (-59.8499, 81.1728) ccw projected
  line L1 (-60.8486, 81.1218) -> (-60.9438, 82.9858) projected
  arc A2 (-59.5793, 83.9675) -> (-60.9438, 82.9858) centre (-59.9451, 83.0368) ccw projected
  arc A3 (-59.5793, 83.9675) -> (-58.4365, 83.6142) centre (-56.644, 91.4364) ccw projected
  arc A4 (-63.3797, 71.8578) -> (-62.4921, 71.5682) centre (-62.8803, 71.8833) ccw projected
  line L2 (-62.4921, 71.5682) -> (-49.8994, 87.0877) projected
  arc A5 (-49.8994, 87.0877) -> (-48.6415, 90.8352) centre (-56.644, 91.4364) ccw projected
  arc A6 (-43.6232, 102.0081) -> (-48.6415, 90.8352) centre (-30.6921, 89.4866) ccw projected
  line L3 (-43.6232, 102.0081) -> (-42.4439, 103.226) projected
  arc A7 (-31.4383, 108.6012) -> (-42.4439, 103.226) centre (-29.5128, 90.7045) ccw projected
  arc A8 (-31.4383, 108.6012) -> (-39.7735, 119.4954) centre (-32.2967, 116.5802) ccw projected
  arc A9 (-58.8326, 99.2446) -> (-39.7735, 119.4954) centre (-74.411, 133.0005) ccw projected
  arc A10 (-58.8326, 99.2446) -> (-64.485, 93.5124) centre (-56.6793, 91.4683) ccw projected
  line L4 (-64.485, 93.5124) -> (-63.3797, 71.8578) projected
  circle A11 centre (-56.6451, 91.4352) radius 5.025 projected
  circle A12 centre (-32.2967, 116.5802) radius 5.025 projected
  circle A13 centre (-56.6451, 91.4352) radius 7.5
  point P0 (0, 0)
  dimension "d39" = 15
extrude "押し出し11" cut sketch "スケッチ13" against normal blind 1 contours A13
properties part number "アーム 揺動節" material "アルミニウム 7075"
